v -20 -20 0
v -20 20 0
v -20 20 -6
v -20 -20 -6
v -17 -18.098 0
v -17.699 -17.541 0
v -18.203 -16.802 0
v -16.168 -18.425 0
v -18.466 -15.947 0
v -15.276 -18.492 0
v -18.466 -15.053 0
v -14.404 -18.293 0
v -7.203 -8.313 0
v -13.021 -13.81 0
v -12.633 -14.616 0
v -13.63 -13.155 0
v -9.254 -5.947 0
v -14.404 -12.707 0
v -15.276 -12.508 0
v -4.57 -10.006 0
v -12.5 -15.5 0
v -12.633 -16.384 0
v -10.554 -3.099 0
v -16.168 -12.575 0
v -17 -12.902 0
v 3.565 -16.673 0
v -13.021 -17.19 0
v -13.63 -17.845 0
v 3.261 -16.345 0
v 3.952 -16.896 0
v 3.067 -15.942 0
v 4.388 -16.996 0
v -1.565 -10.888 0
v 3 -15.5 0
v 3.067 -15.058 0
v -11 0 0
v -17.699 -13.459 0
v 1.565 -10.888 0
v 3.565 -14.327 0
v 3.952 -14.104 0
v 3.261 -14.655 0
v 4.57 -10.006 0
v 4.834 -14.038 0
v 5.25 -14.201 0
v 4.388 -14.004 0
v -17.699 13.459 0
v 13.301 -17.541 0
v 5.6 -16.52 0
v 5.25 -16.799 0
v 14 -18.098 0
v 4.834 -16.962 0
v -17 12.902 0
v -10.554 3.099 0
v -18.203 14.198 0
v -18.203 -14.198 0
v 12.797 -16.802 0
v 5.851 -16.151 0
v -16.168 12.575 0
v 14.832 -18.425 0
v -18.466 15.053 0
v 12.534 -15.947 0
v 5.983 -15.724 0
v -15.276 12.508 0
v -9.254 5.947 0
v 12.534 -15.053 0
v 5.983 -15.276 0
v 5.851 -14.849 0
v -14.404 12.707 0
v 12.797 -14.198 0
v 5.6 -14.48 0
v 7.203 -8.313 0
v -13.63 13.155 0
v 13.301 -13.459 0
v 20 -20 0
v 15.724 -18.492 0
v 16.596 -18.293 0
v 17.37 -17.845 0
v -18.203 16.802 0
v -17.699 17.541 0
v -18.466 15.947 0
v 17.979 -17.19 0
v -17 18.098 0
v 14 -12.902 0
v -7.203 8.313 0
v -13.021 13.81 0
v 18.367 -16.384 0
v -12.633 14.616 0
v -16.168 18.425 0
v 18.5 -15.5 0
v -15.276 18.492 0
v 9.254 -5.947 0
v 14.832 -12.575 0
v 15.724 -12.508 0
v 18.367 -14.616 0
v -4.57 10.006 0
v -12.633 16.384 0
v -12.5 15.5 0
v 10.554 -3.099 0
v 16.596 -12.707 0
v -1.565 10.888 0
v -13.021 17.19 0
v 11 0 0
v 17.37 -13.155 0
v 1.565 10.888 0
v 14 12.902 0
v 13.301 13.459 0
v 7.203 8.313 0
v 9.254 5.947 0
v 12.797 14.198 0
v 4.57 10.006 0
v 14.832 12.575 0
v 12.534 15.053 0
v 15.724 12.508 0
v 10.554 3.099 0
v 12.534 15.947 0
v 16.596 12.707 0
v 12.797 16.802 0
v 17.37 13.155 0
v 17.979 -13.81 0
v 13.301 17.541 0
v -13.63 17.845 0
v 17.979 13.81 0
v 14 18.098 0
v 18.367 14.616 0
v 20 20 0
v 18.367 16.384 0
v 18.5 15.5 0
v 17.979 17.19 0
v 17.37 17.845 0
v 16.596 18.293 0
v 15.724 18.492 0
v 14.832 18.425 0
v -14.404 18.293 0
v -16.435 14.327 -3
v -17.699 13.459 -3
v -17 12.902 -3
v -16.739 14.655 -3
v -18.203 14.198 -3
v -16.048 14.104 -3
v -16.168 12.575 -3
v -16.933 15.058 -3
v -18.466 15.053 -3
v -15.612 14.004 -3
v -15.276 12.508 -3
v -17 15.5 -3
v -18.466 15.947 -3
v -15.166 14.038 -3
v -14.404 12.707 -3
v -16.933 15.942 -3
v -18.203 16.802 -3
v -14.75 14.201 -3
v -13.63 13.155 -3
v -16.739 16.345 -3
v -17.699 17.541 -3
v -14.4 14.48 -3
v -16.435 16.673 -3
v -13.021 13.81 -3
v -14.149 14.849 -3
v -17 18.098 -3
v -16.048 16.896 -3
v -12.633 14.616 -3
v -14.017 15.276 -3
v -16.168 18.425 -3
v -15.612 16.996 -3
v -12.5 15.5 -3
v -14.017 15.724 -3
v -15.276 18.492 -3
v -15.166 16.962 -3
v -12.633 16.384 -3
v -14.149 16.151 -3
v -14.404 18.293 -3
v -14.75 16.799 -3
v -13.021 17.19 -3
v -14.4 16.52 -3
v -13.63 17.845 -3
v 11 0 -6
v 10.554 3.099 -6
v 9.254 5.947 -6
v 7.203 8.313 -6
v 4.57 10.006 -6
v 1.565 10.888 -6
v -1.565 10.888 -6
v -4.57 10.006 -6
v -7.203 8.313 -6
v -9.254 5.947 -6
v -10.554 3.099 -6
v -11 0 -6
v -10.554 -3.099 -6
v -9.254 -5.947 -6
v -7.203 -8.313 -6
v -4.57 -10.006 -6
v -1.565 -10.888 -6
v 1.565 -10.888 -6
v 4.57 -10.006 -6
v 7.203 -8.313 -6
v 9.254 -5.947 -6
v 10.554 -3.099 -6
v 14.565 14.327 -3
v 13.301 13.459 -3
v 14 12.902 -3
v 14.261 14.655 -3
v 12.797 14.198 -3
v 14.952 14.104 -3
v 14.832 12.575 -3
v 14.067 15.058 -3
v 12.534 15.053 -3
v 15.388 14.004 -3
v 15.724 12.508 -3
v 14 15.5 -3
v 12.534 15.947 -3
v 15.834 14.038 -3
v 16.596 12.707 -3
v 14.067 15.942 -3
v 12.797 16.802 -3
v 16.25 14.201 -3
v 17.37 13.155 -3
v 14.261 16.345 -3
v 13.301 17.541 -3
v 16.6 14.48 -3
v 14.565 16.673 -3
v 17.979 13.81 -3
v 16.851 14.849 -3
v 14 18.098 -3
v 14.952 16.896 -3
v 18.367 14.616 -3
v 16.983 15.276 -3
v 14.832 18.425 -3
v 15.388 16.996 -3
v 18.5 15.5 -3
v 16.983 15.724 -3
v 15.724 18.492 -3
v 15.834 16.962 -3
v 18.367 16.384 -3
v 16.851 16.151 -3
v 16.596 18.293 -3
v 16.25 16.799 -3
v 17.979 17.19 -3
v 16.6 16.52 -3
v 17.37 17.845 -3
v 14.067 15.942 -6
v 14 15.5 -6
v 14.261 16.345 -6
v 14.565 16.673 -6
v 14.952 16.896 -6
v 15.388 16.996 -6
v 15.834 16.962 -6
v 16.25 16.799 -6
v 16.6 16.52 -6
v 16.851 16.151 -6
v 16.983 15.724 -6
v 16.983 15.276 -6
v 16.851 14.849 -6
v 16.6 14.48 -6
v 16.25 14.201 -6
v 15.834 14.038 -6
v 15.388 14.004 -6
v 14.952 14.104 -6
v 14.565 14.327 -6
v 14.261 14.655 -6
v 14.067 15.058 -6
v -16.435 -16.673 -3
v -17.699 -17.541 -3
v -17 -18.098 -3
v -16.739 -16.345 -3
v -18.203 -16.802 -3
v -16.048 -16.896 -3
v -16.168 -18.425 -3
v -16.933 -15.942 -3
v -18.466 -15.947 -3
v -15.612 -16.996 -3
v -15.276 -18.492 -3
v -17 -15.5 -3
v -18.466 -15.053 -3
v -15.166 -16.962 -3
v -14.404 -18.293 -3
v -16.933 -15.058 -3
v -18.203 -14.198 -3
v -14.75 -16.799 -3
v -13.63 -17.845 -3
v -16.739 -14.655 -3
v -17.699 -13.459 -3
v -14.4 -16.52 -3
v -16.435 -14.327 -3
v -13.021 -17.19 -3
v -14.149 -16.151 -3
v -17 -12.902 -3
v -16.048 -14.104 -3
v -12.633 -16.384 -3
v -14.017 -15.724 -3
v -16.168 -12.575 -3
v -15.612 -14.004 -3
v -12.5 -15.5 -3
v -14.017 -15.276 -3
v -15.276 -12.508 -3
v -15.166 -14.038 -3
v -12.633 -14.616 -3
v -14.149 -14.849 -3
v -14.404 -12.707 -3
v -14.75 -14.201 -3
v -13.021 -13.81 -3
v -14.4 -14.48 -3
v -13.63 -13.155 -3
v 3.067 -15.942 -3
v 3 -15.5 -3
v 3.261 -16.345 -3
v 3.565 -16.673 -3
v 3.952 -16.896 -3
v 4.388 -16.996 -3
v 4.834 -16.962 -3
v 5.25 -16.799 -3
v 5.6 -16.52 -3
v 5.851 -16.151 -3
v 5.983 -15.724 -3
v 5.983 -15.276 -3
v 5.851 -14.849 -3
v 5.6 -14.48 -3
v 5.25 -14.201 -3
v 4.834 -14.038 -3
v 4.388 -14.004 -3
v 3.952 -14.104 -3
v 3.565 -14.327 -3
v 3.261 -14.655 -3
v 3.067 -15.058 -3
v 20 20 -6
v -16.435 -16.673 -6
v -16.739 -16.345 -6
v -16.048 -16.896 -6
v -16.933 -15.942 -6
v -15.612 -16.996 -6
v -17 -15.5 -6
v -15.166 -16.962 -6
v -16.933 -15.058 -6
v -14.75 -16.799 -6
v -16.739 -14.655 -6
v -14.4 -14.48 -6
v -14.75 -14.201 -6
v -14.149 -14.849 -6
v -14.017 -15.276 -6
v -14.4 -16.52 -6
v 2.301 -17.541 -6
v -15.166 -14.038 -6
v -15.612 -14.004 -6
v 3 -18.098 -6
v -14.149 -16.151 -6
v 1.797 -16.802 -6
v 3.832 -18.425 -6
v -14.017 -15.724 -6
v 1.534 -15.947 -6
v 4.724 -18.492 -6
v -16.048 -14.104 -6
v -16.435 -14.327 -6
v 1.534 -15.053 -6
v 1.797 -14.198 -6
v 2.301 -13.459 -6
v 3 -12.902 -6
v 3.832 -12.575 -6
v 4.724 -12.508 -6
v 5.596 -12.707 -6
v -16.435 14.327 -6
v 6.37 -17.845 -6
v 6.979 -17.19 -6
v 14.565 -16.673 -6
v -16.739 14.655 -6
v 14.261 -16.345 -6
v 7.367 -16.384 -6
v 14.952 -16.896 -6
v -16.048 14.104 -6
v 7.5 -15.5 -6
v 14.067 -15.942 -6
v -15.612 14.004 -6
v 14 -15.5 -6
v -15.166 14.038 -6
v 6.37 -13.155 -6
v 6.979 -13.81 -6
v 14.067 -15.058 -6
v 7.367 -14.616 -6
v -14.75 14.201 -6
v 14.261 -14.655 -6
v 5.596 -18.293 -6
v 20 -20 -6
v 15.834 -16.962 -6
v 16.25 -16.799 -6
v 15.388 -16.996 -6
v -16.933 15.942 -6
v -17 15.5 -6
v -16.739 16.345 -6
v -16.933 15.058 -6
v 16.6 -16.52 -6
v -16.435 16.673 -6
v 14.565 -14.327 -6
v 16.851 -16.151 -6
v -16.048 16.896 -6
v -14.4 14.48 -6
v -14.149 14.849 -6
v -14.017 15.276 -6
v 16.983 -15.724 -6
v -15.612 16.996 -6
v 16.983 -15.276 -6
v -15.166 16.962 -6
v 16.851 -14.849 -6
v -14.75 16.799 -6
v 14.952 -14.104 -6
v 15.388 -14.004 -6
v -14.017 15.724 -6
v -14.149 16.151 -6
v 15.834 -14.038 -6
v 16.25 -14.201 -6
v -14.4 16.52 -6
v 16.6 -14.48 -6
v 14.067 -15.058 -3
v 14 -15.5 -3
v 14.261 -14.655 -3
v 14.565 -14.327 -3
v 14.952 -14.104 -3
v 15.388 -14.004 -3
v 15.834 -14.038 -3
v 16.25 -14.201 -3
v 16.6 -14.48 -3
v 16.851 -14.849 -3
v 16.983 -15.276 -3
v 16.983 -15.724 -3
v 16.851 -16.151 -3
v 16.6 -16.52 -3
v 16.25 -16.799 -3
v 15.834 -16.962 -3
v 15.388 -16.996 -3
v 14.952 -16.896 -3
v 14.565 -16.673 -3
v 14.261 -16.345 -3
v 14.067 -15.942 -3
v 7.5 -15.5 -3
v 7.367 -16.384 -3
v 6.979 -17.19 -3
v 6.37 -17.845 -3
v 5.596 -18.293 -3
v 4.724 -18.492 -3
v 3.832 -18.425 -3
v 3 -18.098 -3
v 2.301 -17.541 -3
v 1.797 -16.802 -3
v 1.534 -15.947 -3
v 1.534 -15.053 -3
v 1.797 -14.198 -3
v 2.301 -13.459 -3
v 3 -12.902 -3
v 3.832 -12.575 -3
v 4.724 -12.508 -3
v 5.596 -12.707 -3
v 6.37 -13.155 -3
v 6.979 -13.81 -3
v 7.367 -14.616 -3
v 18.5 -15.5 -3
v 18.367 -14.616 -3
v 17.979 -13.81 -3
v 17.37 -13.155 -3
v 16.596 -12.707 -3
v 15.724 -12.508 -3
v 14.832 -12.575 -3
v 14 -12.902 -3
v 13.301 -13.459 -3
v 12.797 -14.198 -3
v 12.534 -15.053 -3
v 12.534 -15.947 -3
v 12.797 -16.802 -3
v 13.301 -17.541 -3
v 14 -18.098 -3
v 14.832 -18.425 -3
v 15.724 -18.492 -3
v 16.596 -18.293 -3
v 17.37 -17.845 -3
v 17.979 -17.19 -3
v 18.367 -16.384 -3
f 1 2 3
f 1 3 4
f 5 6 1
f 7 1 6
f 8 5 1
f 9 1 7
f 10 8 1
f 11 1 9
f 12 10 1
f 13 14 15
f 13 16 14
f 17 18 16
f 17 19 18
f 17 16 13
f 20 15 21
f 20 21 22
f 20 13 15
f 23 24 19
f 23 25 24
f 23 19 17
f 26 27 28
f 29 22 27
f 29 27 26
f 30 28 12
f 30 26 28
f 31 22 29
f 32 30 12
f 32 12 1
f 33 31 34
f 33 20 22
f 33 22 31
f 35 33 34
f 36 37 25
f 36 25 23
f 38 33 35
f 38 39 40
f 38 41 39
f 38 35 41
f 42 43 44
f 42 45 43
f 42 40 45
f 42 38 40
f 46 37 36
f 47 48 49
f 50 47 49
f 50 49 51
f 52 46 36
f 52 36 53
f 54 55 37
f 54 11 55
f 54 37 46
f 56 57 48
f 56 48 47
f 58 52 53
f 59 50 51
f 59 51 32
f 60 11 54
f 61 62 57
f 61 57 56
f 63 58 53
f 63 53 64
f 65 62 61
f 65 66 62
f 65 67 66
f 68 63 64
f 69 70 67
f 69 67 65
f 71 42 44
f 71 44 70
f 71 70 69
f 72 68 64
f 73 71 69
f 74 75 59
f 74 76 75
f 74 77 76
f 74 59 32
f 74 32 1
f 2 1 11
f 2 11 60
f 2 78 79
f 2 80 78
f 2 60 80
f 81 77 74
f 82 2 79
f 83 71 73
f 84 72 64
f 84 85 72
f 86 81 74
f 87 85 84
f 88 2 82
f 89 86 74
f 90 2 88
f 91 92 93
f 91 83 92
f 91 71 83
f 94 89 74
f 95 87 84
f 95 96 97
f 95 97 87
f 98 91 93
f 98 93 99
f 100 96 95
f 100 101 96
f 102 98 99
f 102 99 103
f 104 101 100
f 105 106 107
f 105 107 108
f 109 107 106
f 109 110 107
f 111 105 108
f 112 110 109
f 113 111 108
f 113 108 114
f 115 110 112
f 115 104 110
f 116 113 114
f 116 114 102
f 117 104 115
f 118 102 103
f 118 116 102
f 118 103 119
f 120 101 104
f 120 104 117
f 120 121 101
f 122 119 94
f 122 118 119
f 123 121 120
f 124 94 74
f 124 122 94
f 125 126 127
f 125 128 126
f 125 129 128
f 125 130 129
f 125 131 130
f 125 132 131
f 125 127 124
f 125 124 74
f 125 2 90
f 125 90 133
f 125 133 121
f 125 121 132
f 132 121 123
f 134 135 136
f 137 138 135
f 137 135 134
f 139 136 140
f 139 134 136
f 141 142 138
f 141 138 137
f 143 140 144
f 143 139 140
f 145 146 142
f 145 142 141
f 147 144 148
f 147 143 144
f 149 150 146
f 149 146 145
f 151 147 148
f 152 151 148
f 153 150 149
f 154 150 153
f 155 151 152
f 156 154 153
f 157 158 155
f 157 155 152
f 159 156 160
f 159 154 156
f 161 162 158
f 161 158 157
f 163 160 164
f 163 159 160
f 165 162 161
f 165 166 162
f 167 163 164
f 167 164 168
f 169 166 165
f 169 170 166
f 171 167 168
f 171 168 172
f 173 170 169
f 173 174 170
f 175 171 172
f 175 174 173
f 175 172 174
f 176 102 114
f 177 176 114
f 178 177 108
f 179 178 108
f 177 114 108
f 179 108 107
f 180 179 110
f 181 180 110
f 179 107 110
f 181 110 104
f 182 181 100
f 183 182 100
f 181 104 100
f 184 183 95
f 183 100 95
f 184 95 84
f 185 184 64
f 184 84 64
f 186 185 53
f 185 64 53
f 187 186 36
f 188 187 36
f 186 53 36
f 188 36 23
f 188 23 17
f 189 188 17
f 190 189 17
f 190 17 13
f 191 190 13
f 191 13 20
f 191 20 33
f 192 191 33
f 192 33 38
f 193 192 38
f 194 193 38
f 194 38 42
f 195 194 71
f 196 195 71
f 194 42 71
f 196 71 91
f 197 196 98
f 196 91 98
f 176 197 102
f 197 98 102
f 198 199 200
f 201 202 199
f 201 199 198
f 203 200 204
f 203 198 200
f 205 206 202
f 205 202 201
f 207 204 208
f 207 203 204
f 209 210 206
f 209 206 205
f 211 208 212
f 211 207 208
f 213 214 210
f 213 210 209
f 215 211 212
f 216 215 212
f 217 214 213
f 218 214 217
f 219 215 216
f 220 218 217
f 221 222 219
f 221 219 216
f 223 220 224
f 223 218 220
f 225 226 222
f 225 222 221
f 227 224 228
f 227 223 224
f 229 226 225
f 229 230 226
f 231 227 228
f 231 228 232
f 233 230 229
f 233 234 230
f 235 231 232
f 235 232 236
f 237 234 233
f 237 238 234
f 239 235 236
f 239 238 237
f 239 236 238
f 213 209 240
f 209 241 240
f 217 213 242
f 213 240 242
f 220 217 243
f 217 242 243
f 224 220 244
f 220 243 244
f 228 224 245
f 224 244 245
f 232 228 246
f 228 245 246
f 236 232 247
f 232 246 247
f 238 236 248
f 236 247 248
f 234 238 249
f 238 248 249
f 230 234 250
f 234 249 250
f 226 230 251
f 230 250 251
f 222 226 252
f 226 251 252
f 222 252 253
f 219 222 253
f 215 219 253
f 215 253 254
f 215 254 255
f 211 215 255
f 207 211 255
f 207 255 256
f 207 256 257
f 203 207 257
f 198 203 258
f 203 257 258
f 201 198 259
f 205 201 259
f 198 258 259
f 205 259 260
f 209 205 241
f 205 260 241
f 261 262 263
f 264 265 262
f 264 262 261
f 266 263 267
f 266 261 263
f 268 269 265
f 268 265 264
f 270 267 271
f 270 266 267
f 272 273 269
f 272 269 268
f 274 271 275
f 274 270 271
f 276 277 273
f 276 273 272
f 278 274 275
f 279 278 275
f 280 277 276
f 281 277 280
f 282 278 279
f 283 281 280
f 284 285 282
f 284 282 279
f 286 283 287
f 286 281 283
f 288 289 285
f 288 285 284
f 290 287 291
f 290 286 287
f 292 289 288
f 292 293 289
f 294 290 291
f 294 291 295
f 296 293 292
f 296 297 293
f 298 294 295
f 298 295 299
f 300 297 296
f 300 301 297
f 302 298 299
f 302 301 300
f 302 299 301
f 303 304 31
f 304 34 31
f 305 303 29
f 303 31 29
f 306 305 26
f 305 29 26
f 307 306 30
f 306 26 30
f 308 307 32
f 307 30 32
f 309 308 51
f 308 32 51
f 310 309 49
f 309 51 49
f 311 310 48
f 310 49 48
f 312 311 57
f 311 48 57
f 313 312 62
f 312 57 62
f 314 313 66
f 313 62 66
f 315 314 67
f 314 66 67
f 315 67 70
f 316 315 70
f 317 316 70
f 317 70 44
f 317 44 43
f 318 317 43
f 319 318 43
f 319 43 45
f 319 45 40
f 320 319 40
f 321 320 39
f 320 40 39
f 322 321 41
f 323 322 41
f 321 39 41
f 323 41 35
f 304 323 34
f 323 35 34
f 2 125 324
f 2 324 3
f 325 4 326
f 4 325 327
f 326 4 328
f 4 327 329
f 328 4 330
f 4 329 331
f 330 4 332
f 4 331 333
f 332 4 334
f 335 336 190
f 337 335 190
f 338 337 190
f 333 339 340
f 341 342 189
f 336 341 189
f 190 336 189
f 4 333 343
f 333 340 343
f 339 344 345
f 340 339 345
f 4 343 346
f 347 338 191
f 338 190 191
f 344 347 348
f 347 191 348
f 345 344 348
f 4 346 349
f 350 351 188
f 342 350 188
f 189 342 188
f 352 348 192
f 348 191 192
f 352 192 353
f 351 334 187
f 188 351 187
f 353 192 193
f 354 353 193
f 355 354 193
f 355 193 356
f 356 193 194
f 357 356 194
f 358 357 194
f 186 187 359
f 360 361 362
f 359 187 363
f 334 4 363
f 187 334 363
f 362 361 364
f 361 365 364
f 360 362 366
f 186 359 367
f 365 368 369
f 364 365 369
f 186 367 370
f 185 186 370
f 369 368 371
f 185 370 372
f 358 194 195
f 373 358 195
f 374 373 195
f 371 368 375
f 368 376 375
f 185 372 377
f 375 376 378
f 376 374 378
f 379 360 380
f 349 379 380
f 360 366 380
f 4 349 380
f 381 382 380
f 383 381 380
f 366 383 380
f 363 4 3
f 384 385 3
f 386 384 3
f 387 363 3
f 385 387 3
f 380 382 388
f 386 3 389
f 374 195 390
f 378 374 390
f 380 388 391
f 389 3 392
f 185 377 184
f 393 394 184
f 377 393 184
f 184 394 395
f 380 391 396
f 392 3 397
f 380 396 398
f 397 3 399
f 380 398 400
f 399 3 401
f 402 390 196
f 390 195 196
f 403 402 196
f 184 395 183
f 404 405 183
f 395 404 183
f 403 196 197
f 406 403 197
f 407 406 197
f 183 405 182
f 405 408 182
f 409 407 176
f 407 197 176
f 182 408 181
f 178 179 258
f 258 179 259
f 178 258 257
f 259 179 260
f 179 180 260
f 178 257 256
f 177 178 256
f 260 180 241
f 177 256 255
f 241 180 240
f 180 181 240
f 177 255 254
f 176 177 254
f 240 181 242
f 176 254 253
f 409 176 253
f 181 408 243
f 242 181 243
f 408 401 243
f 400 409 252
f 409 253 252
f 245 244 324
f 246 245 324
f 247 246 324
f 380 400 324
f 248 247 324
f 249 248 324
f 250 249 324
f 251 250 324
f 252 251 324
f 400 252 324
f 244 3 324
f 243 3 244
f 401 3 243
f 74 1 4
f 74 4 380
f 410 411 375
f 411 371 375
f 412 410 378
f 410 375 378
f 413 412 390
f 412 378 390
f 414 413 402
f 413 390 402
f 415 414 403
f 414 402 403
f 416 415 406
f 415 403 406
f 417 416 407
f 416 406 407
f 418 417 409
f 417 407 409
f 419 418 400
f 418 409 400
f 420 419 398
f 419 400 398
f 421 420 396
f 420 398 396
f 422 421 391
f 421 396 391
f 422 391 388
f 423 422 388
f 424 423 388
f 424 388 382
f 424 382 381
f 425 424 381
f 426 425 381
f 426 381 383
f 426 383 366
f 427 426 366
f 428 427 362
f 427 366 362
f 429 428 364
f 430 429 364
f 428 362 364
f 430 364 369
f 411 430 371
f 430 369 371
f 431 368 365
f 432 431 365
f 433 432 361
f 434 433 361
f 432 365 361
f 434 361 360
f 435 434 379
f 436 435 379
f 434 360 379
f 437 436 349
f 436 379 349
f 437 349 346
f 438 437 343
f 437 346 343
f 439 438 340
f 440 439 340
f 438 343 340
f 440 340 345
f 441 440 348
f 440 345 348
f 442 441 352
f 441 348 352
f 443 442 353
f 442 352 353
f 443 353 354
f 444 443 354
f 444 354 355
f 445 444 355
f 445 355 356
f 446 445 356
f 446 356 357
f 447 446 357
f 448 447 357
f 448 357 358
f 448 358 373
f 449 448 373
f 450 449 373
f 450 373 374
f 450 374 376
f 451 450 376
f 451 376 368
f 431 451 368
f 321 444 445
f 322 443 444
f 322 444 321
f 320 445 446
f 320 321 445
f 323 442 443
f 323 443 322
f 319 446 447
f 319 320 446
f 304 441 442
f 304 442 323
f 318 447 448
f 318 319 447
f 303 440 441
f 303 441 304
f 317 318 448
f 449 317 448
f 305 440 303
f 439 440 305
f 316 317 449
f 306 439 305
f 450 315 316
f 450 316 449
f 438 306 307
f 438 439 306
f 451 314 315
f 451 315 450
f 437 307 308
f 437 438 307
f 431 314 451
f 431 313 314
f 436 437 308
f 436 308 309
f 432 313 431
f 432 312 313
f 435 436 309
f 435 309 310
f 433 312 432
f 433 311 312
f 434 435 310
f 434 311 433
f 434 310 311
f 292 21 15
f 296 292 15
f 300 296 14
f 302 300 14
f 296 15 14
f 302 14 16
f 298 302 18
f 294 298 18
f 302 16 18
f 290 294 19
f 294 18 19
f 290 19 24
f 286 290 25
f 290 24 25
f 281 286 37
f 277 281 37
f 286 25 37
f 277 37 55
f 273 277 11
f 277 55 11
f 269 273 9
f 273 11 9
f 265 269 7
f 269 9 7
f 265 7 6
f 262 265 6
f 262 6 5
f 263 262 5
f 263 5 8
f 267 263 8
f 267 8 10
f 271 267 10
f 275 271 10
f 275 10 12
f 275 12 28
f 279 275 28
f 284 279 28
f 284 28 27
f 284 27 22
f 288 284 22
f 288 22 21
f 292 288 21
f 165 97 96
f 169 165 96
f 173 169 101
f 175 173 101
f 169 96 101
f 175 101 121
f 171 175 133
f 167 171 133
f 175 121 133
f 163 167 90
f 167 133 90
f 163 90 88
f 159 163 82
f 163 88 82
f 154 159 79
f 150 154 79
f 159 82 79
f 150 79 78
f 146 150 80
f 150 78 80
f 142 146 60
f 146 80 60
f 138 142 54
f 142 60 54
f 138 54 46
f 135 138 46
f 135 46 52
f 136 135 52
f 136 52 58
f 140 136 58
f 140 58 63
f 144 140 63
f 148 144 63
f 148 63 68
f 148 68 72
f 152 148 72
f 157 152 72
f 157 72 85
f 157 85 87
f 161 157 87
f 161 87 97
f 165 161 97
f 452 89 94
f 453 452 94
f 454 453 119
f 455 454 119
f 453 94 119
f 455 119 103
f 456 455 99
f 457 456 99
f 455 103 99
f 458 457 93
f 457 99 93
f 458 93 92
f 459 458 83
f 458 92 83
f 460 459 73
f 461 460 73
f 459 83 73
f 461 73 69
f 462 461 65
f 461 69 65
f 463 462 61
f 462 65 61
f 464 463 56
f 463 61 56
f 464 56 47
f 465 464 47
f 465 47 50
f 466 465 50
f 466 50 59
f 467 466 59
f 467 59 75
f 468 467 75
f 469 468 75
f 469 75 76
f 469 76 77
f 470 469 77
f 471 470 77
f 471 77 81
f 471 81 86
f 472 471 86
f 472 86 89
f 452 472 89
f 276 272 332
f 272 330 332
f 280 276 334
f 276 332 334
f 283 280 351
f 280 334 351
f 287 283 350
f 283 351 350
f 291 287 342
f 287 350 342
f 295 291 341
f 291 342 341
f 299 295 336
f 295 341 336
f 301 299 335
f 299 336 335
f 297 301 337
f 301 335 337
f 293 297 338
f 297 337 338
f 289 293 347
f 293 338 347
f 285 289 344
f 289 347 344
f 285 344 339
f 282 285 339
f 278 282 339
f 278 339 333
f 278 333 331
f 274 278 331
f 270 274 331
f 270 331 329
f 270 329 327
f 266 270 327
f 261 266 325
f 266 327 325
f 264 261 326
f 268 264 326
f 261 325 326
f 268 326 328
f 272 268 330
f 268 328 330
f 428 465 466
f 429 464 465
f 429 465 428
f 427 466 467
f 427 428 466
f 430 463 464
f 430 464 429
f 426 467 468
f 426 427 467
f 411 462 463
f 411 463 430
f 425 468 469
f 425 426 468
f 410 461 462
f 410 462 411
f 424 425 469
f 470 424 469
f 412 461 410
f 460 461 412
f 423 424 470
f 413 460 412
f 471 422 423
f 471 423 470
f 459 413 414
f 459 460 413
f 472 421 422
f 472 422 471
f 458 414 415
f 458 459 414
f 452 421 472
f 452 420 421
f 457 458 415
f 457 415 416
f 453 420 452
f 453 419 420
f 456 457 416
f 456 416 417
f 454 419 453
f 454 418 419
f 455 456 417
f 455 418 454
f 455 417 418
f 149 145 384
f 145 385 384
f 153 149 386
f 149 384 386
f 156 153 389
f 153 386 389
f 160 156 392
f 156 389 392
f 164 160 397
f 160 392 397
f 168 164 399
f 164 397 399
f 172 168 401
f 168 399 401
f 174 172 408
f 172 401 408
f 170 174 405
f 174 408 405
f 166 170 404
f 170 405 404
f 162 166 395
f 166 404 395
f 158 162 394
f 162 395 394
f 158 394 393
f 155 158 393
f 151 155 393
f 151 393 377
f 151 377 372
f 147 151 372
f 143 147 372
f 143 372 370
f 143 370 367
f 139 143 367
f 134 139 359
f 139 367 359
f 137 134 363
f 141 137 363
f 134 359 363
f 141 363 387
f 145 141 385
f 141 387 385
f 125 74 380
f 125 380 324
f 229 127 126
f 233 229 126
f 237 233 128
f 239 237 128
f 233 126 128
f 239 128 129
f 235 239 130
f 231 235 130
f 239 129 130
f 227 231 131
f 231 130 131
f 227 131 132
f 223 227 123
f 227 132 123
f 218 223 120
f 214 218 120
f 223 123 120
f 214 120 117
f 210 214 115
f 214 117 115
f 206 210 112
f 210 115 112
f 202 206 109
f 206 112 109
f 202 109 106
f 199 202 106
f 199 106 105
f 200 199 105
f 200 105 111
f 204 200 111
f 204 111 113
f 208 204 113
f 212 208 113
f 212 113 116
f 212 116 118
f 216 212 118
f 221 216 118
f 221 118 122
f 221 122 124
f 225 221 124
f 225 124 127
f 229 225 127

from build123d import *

# Parameters (mm, degrees)
F0_R           = 11
F1_DEPTH       = 6
F2_D           = 3
F2_CBORE_D     = 6
F2_CBORE_DEPTH = 3
F4_D           = 3
F4_CBORE_D     = 6
F4_CBORE_DEPTH = 3


with BuildPart() as f1:
    # F0 (on Top) → F1 (new body)
    with BuildSketch(Plane.XY):
        Polygon((0, -20), (20, -20), (20, 20), (-20, 20), (-20, -20), align=None)
        Polygon((15.5, -15.5), (0, -15.5), (-15.5, -15.5), (-15.5, 15.5), (15.5, 15.5), align=None, mode=Mode.SUBTRACT)
        Polygon((-15.5, -15.5), (0, -15.5), (15.5, -15.5), (15.5, 15.5), (-15.5, 15.5), align=None)
        Circle(F0_R, mode=Mode.SUBTRACT)
    extrude(amount=-F1_DEPTH)

    # F2 (through all)
    with Locations(Plane.XY):
        with Locations((15.5, 15.5), (15.5, -15.5), (-15.5, -15.5), (-15.5, 15.5)):
            CounterBoreHole(F2_D / 2, F2_CBORE_D / 2, F2_CBORE_DEPTH)

    # F4 (through all)
    with Locations(Plane(origin=(0, 0, -6), x_dir=(1, 0, 0), z_dir=(0, 0, -1))):
        with Locations((4.5, 15.5)):
            CounterBoreHole(F4_D / 2, F4_CBORE_D / 2, F4_CBORE_DEPTH)


solid = f1.part
